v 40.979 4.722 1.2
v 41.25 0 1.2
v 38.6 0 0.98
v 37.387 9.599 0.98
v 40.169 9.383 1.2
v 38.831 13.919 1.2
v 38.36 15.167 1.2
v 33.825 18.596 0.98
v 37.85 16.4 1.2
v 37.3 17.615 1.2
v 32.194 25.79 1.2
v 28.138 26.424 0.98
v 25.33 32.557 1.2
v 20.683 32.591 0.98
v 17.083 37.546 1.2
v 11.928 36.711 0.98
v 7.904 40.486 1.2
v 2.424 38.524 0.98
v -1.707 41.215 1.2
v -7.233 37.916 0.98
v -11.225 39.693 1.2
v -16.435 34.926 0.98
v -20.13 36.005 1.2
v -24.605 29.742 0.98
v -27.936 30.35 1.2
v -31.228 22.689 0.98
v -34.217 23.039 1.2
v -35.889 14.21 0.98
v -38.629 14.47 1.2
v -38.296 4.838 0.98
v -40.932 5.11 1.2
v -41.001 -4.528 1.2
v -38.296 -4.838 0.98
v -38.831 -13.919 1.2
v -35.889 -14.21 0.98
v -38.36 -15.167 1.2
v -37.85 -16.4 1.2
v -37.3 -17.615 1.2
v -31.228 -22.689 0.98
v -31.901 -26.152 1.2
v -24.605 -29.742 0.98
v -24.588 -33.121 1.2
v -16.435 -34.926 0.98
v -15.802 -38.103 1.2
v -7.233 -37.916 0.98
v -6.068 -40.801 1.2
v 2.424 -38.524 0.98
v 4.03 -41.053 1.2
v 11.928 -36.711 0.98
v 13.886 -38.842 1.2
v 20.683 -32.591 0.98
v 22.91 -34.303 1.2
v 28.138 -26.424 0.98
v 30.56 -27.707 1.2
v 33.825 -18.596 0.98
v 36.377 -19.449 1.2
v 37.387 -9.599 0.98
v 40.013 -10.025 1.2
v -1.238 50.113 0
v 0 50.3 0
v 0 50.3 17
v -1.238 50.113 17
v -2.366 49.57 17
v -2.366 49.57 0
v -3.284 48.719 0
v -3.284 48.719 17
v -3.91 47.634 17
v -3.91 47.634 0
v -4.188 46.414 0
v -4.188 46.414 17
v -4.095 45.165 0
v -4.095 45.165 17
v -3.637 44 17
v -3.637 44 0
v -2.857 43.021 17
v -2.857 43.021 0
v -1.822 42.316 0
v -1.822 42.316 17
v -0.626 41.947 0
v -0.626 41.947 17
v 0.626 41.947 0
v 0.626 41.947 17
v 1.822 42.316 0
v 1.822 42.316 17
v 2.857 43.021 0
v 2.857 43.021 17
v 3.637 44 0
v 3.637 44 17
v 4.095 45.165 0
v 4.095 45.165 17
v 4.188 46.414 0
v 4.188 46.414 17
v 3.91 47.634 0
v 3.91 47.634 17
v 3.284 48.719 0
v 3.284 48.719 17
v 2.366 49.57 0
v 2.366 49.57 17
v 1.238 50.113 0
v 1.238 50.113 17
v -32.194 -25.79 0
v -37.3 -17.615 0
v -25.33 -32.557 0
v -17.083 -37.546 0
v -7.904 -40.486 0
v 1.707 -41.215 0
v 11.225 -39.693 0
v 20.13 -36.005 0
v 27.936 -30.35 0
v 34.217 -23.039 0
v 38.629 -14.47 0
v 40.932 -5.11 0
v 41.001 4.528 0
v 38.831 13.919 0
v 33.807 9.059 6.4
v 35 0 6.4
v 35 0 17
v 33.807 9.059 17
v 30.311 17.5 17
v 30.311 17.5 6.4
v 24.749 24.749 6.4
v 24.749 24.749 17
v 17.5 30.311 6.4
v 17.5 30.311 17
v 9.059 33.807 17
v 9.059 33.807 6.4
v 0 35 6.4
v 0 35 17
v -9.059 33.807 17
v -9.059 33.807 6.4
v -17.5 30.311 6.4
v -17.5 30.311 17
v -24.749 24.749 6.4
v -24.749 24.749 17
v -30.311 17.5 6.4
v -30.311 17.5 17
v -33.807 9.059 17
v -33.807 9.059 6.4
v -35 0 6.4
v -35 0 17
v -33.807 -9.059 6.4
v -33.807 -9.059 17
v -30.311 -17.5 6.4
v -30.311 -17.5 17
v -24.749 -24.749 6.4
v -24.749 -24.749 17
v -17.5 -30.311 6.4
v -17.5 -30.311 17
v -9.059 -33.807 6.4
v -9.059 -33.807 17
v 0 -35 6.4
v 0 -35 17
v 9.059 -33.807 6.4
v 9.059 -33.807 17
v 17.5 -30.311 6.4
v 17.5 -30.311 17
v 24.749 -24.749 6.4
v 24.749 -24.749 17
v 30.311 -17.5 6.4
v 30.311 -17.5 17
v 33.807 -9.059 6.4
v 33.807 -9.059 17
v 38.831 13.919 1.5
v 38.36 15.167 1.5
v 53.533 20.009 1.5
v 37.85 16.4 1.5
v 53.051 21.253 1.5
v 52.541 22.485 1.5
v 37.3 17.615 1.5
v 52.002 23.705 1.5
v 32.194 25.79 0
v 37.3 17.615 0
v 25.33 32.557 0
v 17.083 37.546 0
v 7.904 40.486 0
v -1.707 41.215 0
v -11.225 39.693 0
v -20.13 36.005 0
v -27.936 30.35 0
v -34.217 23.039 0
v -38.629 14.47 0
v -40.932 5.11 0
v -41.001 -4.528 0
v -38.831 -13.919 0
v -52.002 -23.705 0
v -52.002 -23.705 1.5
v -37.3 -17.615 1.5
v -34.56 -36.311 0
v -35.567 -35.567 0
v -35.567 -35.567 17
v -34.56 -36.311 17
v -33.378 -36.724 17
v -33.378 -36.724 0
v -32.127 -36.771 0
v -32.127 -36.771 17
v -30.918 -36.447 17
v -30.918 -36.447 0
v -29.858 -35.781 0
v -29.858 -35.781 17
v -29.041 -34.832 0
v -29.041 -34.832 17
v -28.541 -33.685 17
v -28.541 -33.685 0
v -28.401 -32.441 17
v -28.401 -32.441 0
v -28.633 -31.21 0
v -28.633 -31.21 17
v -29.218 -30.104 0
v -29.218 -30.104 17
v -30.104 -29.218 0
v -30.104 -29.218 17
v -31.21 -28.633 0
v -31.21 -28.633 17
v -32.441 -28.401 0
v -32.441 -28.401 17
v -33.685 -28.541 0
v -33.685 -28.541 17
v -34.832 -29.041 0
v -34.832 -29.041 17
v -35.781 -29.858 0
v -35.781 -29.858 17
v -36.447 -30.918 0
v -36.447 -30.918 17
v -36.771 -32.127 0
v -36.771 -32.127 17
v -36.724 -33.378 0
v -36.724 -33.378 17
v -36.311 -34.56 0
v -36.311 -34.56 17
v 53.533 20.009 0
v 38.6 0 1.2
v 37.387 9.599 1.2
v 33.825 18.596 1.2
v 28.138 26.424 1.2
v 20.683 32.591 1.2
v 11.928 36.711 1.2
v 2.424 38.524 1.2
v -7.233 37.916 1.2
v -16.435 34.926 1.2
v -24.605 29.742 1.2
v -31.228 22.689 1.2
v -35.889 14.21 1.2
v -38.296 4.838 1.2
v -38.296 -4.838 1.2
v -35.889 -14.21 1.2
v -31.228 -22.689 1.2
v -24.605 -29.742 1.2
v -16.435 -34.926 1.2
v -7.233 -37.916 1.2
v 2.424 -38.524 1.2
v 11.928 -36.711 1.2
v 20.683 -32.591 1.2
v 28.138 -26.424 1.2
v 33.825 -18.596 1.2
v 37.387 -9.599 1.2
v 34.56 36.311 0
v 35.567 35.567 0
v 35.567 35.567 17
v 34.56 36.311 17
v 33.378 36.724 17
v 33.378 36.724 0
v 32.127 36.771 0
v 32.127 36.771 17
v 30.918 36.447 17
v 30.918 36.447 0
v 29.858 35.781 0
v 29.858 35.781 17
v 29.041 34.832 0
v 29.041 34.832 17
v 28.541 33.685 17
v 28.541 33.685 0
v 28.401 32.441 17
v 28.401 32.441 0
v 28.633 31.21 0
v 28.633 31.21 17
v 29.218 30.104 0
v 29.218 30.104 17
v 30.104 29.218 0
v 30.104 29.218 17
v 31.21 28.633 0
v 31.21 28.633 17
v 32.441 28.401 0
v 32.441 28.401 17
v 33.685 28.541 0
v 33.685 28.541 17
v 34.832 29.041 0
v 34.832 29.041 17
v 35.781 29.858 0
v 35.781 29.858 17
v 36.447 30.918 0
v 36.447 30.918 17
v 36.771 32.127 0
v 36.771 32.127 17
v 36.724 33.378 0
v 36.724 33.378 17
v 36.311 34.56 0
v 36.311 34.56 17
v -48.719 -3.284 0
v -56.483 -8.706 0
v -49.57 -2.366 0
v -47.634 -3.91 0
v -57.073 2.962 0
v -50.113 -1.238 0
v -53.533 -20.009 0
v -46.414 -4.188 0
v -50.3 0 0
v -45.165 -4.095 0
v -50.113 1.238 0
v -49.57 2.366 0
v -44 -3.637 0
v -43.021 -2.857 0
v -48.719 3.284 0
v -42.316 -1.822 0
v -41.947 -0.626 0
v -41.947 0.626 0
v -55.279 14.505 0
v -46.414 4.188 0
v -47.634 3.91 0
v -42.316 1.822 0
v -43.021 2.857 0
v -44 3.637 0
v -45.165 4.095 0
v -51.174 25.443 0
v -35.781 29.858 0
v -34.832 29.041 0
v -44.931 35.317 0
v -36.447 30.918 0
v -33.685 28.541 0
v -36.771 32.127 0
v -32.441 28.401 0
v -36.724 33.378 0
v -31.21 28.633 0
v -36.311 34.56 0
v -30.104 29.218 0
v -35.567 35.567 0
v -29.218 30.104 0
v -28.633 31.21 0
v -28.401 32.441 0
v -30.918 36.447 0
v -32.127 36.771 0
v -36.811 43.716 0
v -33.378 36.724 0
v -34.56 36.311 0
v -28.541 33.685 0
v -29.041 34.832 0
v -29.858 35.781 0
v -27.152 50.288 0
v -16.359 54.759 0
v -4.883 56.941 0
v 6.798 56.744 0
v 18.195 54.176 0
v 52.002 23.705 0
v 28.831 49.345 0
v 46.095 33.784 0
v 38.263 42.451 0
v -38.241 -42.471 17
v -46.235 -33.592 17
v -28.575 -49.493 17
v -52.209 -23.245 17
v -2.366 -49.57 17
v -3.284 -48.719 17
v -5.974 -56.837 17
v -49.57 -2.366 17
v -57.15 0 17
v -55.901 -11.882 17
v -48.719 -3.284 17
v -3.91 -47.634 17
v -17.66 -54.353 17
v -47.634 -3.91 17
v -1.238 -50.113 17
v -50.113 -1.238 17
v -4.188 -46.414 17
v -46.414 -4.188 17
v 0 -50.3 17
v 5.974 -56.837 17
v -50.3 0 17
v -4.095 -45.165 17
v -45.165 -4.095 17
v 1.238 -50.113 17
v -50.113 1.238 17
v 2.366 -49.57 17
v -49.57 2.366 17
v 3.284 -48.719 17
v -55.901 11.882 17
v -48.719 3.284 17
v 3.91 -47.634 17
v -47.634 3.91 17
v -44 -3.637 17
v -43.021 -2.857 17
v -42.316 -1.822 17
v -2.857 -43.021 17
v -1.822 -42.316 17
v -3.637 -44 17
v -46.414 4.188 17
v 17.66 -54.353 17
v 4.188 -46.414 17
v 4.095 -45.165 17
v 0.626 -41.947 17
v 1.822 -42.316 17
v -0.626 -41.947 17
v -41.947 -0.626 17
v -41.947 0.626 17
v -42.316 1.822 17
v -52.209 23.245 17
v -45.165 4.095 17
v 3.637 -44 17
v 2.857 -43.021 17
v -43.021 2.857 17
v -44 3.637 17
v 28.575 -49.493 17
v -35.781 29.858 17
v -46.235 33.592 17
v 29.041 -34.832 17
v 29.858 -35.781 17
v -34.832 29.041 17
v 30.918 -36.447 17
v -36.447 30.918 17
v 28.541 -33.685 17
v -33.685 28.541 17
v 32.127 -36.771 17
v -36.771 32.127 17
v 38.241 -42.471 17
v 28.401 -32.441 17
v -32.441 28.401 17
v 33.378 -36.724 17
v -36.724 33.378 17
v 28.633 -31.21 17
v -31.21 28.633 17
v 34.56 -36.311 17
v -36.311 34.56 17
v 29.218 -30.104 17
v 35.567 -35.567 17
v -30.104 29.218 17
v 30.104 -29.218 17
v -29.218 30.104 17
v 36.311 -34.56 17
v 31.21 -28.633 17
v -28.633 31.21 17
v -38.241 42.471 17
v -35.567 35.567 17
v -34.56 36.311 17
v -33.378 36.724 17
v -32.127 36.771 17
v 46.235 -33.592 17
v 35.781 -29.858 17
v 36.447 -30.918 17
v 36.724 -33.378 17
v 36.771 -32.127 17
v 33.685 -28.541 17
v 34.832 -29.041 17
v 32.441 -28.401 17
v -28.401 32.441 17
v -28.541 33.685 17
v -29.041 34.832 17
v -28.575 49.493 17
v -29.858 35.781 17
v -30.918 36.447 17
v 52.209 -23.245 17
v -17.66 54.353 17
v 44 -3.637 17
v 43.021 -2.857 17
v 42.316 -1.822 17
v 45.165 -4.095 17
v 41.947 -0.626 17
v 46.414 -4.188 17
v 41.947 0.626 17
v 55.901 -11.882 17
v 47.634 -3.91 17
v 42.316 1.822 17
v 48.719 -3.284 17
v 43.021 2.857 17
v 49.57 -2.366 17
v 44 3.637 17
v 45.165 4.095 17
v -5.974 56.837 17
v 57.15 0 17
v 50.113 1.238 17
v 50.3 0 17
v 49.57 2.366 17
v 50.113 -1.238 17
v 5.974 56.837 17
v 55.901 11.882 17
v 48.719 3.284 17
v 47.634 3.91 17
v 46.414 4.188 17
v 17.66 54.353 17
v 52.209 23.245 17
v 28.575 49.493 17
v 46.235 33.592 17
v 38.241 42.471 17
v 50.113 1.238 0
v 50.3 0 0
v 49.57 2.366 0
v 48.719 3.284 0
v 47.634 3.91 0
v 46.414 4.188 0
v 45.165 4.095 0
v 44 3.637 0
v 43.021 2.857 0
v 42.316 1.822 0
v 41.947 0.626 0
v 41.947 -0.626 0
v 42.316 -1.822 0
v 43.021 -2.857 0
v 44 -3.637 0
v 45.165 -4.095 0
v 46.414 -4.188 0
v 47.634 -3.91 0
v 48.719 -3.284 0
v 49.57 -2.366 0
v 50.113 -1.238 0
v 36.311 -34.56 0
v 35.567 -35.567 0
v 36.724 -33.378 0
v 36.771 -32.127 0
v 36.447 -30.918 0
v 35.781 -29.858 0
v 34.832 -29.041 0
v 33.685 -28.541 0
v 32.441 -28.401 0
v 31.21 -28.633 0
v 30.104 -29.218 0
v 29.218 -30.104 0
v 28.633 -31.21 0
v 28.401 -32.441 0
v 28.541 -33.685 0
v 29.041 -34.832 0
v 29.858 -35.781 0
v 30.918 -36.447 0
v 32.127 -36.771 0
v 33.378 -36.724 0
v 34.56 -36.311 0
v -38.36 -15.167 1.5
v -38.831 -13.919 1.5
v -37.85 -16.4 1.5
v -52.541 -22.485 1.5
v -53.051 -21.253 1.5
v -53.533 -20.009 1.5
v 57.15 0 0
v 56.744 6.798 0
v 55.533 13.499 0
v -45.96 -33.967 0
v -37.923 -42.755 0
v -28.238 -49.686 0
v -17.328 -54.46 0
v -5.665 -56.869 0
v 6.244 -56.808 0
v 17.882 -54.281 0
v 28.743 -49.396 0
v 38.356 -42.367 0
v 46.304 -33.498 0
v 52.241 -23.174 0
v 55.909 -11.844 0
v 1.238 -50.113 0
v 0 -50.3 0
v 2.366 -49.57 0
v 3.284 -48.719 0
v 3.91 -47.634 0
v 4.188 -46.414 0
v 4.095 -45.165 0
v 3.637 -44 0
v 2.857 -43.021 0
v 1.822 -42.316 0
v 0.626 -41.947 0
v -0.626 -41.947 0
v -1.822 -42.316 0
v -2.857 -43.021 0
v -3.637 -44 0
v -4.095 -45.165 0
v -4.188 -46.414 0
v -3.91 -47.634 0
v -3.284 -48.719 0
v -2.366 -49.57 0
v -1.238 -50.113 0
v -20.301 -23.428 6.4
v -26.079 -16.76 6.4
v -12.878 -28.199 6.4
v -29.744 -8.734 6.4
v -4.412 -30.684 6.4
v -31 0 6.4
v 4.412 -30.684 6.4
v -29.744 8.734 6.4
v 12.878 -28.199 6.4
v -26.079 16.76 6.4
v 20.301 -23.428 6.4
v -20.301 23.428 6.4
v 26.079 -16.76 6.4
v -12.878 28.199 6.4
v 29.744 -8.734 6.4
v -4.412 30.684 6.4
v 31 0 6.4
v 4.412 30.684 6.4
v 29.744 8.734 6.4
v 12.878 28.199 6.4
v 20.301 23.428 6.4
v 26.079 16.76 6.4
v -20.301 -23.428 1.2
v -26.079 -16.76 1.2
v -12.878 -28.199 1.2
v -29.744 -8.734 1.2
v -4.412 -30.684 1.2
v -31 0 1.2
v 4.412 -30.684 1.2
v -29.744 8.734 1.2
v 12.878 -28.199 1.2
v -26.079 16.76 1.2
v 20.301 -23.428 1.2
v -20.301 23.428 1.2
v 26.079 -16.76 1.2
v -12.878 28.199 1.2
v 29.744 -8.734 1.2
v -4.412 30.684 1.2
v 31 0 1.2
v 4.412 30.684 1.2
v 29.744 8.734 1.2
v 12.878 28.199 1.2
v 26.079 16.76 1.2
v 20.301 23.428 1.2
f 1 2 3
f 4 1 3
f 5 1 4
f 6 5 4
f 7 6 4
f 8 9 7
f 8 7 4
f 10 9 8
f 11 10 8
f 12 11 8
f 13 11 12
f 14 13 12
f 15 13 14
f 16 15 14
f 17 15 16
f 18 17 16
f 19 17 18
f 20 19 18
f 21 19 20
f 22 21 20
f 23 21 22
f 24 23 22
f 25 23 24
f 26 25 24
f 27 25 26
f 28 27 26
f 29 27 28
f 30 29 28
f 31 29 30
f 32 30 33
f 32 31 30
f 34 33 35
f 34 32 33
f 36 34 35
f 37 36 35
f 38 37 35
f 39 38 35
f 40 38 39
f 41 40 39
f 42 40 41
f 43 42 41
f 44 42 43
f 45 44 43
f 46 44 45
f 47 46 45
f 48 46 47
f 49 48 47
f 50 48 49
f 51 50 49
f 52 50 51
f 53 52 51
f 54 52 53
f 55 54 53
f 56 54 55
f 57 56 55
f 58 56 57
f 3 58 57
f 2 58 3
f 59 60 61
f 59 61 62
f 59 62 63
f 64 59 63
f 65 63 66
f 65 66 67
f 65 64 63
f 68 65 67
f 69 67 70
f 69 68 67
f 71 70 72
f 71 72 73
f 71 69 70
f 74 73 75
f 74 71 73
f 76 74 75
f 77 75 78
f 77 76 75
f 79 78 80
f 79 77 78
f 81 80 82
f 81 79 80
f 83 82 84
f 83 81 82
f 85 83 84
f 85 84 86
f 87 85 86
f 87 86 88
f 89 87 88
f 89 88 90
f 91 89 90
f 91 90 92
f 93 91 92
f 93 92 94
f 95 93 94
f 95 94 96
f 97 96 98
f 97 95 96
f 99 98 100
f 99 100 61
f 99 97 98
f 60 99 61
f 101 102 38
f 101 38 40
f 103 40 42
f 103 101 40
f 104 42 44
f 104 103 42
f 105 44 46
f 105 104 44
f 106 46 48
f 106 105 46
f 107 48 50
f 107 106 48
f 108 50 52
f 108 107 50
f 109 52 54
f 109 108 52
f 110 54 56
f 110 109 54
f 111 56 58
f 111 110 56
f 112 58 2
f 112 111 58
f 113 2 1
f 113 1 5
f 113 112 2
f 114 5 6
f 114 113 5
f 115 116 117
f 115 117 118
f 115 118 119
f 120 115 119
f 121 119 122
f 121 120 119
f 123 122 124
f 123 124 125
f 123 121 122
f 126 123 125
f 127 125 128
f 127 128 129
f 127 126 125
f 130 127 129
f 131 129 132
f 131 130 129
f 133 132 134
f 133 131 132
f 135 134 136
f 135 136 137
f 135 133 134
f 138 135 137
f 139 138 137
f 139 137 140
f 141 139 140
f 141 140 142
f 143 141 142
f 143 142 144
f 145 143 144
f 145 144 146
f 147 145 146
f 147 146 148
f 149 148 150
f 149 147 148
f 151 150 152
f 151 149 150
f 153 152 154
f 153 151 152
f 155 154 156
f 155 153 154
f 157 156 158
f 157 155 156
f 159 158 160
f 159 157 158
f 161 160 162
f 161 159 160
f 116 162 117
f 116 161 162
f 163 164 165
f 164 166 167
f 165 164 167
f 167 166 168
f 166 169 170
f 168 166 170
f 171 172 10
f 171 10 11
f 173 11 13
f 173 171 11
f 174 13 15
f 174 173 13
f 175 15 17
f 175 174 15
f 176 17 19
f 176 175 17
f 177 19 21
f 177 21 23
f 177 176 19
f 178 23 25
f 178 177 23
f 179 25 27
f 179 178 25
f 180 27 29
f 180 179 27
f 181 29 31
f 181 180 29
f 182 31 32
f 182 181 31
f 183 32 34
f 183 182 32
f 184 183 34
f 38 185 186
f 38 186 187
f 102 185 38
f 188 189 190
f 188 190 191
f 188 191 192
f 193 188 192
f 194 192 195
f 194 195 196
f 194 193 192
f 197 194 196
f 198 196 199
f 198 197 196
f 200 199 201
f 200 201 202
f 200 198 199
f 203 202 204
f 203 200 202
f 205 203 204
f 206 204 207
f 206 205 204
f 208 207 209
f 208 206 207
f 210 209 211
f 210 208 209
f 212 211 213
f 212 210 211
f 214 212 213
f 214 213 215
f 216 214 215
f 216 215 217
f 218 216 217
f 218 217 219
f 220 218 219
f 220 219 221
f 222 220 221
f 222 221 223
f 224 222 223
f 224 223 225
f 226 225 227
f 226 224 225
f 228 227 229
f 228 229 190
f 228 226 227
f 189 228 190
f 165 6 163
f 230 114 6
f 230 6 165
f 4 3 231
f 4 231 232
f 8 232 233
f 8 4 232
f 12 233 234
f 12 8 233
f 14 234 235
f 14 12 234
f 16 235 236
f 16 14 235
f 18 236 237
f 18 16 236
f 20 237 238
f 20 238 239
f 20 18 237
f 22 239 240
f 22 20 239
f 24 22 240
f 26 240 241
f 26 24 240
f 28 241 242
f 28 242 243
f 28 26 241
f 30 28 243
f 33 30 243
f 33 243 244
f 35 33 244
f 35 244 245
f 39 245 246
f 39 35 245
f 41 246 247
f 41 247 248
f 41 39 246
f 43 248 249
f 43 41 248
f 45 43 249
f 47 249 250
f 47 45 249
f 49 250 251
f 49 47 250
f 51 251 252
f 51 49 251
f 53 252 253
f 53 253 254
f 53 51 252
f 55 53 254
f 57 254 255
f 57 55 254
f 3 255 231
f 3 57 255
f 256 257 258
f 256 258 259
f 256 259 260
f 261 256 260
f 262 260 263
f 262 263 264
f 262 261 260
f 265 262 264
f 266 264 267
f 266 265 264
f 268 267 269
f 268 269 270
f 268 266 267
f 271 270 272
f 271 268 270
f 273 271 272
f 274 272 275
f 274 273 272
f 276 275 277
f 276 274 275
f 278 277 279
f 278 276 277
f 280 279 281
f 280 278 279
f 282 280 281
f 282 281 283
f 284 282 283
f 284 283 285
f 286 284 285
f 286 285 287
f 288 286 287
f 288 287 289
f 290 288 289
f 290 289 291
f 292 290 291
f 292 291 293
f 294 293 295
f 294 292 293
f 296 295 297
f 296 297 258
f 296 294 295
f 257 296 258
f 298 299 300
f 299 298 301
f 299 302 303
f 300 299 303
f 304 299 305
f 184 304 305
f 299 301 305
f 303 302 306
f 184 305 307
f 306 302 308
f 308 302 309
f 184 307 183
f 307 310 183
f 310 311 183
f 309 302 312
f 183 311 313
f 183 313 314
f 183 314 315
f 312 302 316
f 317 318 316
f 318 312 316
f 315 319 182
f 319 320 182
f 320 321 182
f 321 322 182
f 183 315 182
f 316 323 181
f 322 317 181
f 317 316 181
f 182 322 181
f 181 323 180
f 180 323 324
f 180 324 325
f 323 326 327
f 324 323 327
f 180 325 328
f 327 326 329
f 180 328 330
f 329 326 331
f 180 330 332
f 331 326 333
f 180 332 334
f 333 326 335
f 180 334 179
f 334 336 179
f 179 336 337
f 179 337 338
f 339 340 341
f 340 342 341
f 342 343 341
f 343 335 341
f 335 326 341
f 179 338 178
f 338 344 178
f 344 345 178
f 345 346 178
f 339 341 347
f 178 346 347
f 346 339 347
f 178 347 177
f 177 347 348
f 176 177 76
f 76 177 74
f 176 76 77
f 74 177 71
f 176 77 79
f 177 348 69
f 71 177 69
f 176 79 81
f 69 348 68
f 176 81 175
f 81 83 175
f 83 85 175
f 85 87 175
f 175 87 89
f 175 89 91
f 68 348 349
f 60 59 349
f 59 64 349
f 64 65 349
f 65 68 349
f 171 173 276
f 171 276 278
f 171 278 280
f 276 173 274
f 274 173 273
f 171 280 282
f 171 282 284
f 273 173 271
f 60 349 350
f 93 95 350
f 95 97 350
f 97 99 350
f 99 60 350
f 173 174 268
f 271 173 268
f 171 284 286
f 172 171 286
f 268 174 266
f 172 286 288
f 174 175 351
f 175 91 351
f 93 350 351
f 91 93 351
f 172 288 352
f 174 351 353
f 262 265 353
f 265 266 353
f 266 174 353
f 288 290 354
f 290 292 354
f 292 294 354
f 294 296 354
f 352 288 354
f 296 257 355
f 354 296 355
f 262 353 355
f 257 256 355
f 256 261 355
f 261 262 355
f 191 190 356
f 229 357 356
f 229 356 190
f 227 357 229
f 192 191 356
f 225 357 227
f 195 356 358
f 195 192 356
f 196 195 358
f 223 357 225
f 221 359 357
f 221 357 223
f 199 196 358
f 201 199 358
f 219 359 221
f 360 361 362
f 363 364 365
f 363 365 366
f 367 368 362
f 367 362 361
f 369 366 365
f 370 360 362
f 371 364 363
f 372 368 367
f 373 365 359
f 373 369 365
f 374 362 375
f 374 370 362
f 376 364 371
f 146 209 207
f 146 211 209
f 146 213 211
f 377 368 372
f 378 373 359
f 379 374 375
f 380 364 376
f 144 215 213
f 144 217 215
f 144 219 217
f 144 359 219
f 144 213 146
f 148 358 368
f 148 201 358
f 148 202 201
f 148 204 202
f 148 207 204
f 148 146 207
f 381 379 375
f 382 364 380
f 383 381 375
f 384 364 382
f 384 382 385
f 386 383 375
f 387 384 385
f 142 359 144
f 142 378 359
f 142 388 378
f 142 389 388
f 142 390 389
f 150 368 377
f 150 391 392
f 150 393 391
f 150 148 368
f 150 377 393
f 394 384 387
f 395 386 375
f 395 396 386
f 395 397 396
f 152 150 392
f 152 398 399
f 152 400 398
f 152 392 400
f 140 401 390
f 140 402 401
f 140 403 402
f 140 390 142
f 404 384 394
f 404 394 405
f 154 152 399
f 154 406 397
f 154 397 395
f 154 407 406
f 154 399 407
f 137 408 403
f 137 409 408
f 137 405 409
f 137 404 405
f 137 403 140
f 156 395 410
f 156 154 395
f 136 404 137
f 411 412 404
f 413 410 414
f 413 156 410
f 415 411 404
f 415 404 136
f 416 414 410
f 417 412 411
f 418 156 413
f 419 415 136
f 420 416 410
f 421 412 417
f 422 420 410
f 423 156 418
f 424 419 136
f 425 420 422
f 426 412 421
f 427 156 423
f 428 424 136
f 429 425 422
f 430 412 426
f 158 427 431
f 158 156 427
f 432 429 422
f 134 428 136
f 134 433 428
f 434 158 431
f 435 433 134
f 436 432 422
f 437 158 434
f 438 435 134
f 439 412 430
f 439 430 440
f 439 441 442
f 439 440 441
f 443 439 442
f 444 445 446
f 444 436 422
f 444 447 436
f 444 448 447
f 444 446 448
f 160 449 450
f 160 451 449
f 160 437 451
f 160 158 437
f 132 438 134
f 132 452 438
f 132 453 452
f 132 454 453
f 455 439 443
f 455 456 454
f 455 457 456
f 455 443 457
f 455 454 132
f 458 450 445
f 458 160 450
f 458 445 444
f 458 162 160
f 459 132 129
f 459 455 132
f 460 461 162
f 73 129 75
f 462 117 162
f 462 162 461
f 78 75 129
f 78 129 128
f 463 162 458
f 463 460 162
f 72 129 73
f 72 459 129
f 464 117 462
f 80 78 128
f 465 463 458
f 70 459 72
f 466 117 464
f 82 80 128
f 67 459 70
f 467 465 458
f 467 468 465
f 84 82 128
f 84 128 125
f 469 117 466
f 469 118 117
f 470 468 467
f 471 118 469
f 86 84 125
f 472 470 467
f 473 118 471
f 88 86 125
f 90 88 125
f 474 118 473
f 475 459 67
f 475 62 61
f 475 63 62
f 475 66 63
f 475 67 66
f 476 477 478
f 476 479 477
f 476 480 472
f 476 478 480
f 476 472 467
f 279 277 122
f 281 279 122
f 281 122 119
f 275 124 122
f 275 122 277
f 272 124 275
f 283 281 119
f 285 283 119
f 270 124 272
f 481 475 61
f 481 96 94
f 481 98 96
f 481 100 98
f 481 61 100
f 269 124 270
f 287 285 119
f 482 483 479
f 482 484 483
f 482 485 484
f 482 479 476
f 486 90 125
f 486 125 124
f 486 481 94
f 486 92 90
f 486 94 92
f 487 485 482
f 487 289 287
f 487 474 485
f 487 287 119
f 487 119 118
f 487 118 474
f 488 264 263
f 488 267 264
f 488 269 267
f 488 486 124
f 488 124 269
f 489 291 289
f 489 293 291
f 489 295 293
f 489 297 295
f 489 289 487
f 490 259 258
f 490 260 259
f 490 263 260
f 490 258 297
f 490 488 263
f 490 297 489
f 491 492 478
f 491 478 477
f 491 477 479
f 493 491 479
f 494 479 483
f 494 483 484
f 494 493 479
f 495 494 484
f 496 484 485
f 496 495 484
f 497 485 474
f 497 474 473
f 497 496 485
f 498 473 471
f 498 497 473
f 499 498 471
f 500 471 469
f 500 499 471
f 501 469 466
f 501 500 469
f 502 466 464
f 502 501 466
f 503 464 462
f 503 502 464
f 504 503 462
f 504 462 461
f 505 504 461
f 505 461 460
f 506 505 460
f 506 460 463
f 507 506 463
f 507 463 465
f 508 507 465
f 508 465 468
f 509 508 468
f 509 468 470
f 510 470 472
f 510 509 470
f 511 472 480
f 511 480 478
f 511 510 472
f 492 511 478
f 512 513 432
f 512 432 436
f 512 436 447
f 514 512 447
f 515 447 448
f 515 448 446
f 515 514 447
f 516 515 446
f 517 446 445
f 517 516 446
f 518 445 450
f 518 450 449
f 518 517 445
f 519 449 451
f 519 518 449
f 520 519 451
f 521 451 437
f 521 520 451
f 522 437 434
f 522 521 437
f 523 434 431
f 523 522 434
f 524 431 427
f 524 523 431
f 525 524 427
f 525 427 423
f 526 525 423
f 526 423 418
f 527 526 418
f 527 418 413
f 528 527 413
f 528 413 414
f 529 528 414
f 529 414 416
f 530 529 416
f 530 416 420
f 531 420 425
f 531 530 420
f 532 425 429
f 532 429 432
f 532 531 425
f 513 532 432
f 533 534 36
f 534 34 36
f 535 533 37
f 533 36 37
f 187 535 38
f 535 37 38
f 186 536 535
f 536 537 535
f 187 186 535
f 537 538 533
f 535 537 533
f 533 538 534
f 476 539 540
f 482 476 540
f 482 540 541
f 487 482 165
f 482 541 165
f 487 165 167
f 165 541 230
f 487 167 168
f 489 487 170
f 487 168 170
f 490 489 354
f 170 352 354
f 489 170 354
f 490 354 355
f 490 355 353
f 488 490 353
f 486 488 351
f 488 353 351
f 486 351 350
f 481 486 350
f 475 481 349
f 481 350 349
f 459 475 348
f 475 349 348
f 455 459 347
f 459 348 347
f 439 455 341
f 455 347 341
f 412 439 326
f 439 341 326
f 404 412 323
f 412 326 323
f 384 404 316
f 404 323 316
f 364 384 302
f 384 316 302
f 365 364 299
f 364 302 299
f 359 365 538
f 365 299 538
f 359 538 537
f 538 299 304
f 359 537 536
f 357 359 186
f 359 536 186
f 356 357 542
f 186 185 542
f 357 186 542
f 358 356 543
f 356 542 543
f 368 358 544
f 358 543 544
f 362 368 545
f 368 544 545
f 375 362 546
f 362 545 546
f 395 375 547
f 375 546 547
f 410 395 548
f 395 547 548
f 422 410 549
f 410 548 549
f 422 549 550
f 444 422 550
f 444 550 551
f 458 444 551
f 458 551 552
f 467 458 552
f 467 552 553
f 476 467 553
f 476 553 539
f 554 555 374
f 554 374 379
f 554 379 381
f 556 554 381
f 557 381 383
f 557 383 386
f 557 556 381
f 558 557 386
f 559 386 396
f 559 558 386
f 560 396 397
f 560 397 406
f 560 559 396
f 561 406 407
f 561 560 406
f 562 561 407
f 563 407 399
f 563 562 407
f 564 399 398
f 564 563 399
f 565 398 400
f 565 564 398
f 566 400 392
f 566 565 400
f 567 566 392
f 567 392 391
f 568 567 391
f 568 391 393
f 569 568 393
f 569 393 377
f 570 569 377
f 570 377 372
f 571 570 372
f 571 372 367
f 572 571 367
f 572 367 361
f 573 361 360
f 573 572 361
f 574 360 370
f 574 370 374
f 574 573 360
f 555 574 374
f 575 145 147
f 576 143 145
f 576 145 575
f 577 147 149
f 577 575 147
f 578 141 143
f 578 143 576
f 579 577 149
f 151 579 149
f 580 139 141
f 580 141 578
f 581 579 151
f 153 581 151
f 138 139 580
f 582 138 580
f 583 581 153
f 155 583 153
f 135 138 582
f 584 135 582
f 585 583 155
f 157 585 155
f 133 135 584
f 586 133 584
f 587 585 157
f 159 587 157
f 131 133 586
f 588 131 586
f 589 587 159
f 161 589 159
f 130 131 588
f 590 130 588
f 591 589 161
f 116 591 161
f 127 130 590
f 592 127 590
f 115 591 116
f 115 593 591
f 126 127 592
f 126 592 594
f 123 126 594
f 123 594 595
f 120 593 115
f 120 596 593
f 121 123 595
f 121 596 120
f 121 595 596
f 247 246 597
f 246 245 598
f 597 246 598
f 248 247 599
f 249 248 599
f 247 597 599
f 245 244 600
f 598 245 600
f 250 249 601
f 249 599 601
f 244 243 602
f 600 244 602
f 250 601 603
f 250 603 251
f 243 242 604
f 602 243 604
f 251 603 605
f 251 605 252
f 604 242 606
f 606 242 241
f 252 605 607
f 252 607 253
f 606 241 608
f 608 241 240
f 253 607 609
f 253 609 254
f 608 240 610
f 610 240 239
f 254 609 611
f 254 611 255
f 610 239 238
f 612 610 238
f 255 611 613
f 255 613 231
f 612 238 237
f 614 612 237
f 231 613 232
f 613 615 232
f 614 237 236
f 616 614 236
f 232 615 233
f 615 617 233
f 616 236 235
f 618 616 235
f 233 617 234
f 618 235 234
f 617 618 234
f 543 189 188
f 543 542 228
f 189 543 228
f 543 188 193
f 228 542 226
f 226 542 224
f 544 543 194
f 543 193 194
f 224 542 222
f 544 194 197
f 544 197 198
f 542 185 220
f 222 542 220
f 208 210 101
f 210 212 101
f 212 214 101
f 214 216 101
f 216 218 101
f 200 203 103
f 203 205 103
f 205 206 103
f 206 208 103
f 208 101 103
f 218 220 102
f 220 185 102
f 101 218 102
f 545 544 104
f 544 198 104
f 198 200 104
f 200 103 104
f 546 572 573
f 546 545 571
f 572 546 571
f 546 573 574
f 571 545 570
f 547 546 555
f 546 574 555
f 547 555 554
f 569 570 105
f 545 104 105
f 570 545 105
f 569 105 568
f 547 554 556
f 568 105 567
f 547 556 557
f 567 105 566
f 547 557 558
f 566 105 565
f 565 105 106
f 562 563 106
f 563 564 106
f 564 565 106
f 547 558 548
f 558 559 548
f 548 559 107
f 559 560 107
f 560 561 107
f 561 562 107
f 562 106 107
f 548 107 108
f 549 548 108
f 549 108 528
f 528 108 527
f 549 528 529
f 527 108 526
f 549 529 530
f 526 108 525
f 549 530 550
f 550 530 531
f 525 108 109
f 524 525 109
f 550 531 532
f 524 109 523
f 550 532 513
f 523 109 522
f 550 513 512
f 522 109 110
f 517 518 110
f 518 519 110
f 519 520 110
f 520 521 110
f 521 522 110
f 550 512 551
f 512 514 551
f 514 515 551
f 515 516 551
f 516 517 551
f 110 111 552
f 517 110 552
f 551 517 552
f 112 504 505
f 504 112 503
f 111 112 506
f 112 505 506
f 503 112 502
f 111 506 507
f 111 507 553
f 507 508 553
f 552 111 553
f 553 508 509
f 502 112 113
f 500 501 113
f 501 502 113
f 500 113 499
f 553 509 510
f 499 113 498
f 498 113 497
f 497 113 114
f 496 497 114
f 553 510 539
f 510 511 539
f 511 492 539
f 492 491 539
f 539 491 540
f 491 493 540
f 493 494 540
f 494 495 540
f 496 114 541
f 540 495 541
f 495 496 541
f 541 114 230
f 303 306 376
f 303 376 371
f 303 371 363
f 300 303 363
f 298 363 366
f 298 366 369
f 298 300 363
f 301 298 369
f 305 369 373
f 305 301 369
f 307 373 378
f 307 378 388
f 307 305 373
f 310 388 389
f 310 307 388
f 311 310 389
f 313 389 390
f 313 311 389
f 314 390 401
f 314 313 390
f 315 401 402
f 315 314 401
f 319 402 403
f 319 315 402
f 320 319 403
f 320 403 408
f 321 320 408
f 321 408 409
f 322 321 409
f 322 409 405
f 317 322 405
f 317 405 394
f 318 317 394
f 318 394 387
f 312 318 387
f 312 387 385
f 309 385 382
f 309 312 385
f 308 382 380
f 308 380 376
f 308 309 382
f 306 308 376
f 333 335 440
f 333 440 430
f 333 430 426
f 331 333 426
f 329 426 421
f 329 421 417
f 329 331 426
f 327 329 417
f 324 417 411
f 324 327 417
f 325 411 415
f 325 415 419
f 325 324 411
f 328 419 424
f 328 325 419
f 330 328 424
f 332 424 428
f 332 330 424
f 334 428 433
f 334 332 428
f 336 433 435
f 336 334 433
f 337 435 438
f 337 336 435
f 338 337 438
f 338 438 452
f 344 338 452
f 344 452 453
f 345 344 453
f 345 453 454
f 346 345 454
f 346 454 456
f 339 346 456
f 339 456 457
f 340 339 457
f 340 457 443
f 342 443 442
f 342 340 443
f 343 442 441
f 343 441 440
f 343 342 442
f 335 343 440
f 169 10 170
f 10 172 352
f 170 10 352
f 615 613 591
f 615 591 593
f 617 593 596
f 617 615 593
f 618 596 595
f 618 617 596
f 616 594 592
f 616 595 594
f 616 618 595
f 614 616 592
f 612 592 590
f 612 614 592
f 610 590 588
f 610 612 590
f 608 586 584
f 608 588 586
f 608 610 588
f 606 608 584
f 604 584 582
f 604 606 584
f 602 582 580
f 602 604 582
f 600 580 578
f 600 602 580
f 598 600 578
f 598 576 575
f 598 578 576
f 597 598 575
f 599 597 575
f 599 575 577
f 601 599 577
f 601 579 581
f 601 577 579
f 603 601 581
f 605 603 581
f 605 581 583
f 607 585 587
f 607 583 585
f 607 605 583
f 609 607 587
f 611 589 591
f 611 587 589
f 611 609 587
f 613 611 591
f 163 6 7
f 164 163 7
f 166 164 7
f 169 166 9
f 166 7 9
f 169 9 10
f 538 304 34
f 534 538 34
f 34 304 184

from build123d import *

# Parameters (mm, degrees)
CYLINDER025_R             = 41.25
CYLINDER025_DEPTH         = 1.5
BOX002_W                  = 16.9
BOX002_H                  = 4
BOX002_DEPTH              = 1.5
BOX003_W                  = 16.9
BOX003_H                  = 4
BOX003_DEPTH              = 1.5
FUSION008_PLACEMENT_ANGLE = 22.5
CYLINDER018_R             = 35
CYLINDER018_DEPTH         = 10.6
CYLINDER019_R             = 31
CYLINDER019_DEPTH         = 17
CYLINDER023_R             = 4.2
CYLINDER023_DEPTH         = 17
ARRAY004_COUNT            = 8
CYLINDER022_R             = 38.6
CYLINDER022_DEPTH         = 0.22
CYLINDER021_R             = 41.25
CYLINDER021_DEPTH         = 1.2
CYLINDER020_R             = 57.15
CYLINDER020_DEPTH         = 17


with BuildPart() as cylinder025:
    # Cylinder025 → Cylinder025 (new body)
    with BuildSketch(Plane.XY):
        Circle(CYLINDER025_R)
    extrude(amount=CYLINDER025_DEPTH)


with BuildPart() as cube002:
    # Box002 → Box002 (new body)
    with BuildSketch(Plane(origin=(40.75, -2, 0), x_dir=(1, 0, 0), z_dir=(0, 0, 1))):
        with Locations((8.45, 2)):
            Rectangle(BOX002_W, BOX002_H)
    extrude(amount=BOX002_DEPTH)


with BuildPart() as leaktestgrooves02:
    # Box003 → Box003 (new body)
    with BuildSketch(Plane(origin=(-57.65, -2, 0), x_dir=(1, 0, 0), z_dir=(0, 0, 1))):
        with Locations((8.45, 2)):
            Rectangle(BOX003_W, BOX003_H)
    extrude(amount=BOX003_DEPTH)

    # Fusion008: union Cube002
    add(cube002.part)


with BuildPart() as leaktestgrooves02_1:
    # Fusion008 placement: moved
    add(leaktestgrooves02.part.rotate(Axis((0, 0, 0), (0, 0, 1)), FUSION008_PLACEMENT_ANGLE))

    # Cut021: cut Cylinder025
    add(cylinder025.part, mode=Mode.SUBTRACT)


with BuildPart() as cylinder018:
    # Cylinder018 → Cylinder018 (new body)
    with BuildSketch(Plane.XY.offset(6.4)):
        Circle(CYLINDER018_R)
    extrude(amount=CYLINDER018_DEPTH)


with BuildPart() as fusion006:
    # Cylinder019 → Cylinder019 (new body)
    with BuildSketch(Plane.XY):
        Circle(CYLINDER019_R)
    extrude(amount=CYLINDER019_DEPTH)

    # Fusion006: union Cylinder018
    add(cylinder018.part)


with BuildPart() as boltholearray004:
    # Cylinder023 → Cylinder023 (new body)
    with BuildSketch(Plane(origin=(46.1, 0, 0), x_dir=(1, 0, 0), z_dir=(0, 0, 1))):
        Circle(CYLINDER023_R)
    extrude(amount=CYLINDER023_DEPTH)

    # Array004: BoltHoleArray004 ×8 about axis
    array004_axis = Axis((0, 0, 0), (0, 0, 1))


with BuildPart() as boltholearray004_1:
    add(boltholearray004.part)
    for i in range(1, ARRAY004_COUNT):
        add(boltholearray004.part.rotate(array004_axis, i * 360 / ARRAY004_COUNT))


with BuildPart() as cylinder022:
    # Cylinder022 → Cylinder022 (new body)
    with BuildSketch(Plane.XY):
        Circle(CYLINDER022_R)
    extrude(amount=CYLINDER022_DEPTH)


with BuildPart() as knifeedge004:
    # Cone004 → Cone004 (revolve)
    with BuildSketch(Plane.XZ):
        Polygon((0, 0), (38.6, 0), (41.25, 0.22), (0, 0.22), align=None)
    revolve(axis=Axis((0, 0, 0), (0, 0, 1)))

    # Cut016: cut Cylinder022
    add(cylinder022.part, mode=Mode.SUBTRACT)


with BuildPart() as knifeedge004_1:
    # Cut016 placement: moved
    add(knifeedge004.part.moved(Location((0, 0, 0.98))))


with BuildPart() as sealrecess004:
    # Cylinder021 → Cylinder021 (new body)
    with BuildSketch(Plane.XY):
        Circle(CYLINDER021_R)
    extrude(amount=CYLINDER021_DEPTH)


with BuildPart() as weldflange_nonrotatable:
    # Cylinder020 → Cylinder020 (new body)
    with BuildSketch(Plane.XY):
        Circle(CYLINDER020_R)
    extrude(amount=CYLINDER020_DEPTH)

    # Cut015: cut SealRecess004
    add(sealrecess004.part, mode=Mode.SUBTRACT)

    # Fusion005: union KnifeEdge004
    add(knifeedge004_1.part)

    # Cut017: cut BoltHoleArray004
    add(boltholearray004_1.part, mode=Mode.SUBTRACT)

    # Cut018: cut Fusion006
    add(fusion006.part, mode=Mode.SUBTRACT)

    # Cut024: cut LeakTestGrooves02
    add(leaktestgrooves02_1.part, mode=Mode.SUBTRACT)


solid = weldflange_nonrotatable.part
